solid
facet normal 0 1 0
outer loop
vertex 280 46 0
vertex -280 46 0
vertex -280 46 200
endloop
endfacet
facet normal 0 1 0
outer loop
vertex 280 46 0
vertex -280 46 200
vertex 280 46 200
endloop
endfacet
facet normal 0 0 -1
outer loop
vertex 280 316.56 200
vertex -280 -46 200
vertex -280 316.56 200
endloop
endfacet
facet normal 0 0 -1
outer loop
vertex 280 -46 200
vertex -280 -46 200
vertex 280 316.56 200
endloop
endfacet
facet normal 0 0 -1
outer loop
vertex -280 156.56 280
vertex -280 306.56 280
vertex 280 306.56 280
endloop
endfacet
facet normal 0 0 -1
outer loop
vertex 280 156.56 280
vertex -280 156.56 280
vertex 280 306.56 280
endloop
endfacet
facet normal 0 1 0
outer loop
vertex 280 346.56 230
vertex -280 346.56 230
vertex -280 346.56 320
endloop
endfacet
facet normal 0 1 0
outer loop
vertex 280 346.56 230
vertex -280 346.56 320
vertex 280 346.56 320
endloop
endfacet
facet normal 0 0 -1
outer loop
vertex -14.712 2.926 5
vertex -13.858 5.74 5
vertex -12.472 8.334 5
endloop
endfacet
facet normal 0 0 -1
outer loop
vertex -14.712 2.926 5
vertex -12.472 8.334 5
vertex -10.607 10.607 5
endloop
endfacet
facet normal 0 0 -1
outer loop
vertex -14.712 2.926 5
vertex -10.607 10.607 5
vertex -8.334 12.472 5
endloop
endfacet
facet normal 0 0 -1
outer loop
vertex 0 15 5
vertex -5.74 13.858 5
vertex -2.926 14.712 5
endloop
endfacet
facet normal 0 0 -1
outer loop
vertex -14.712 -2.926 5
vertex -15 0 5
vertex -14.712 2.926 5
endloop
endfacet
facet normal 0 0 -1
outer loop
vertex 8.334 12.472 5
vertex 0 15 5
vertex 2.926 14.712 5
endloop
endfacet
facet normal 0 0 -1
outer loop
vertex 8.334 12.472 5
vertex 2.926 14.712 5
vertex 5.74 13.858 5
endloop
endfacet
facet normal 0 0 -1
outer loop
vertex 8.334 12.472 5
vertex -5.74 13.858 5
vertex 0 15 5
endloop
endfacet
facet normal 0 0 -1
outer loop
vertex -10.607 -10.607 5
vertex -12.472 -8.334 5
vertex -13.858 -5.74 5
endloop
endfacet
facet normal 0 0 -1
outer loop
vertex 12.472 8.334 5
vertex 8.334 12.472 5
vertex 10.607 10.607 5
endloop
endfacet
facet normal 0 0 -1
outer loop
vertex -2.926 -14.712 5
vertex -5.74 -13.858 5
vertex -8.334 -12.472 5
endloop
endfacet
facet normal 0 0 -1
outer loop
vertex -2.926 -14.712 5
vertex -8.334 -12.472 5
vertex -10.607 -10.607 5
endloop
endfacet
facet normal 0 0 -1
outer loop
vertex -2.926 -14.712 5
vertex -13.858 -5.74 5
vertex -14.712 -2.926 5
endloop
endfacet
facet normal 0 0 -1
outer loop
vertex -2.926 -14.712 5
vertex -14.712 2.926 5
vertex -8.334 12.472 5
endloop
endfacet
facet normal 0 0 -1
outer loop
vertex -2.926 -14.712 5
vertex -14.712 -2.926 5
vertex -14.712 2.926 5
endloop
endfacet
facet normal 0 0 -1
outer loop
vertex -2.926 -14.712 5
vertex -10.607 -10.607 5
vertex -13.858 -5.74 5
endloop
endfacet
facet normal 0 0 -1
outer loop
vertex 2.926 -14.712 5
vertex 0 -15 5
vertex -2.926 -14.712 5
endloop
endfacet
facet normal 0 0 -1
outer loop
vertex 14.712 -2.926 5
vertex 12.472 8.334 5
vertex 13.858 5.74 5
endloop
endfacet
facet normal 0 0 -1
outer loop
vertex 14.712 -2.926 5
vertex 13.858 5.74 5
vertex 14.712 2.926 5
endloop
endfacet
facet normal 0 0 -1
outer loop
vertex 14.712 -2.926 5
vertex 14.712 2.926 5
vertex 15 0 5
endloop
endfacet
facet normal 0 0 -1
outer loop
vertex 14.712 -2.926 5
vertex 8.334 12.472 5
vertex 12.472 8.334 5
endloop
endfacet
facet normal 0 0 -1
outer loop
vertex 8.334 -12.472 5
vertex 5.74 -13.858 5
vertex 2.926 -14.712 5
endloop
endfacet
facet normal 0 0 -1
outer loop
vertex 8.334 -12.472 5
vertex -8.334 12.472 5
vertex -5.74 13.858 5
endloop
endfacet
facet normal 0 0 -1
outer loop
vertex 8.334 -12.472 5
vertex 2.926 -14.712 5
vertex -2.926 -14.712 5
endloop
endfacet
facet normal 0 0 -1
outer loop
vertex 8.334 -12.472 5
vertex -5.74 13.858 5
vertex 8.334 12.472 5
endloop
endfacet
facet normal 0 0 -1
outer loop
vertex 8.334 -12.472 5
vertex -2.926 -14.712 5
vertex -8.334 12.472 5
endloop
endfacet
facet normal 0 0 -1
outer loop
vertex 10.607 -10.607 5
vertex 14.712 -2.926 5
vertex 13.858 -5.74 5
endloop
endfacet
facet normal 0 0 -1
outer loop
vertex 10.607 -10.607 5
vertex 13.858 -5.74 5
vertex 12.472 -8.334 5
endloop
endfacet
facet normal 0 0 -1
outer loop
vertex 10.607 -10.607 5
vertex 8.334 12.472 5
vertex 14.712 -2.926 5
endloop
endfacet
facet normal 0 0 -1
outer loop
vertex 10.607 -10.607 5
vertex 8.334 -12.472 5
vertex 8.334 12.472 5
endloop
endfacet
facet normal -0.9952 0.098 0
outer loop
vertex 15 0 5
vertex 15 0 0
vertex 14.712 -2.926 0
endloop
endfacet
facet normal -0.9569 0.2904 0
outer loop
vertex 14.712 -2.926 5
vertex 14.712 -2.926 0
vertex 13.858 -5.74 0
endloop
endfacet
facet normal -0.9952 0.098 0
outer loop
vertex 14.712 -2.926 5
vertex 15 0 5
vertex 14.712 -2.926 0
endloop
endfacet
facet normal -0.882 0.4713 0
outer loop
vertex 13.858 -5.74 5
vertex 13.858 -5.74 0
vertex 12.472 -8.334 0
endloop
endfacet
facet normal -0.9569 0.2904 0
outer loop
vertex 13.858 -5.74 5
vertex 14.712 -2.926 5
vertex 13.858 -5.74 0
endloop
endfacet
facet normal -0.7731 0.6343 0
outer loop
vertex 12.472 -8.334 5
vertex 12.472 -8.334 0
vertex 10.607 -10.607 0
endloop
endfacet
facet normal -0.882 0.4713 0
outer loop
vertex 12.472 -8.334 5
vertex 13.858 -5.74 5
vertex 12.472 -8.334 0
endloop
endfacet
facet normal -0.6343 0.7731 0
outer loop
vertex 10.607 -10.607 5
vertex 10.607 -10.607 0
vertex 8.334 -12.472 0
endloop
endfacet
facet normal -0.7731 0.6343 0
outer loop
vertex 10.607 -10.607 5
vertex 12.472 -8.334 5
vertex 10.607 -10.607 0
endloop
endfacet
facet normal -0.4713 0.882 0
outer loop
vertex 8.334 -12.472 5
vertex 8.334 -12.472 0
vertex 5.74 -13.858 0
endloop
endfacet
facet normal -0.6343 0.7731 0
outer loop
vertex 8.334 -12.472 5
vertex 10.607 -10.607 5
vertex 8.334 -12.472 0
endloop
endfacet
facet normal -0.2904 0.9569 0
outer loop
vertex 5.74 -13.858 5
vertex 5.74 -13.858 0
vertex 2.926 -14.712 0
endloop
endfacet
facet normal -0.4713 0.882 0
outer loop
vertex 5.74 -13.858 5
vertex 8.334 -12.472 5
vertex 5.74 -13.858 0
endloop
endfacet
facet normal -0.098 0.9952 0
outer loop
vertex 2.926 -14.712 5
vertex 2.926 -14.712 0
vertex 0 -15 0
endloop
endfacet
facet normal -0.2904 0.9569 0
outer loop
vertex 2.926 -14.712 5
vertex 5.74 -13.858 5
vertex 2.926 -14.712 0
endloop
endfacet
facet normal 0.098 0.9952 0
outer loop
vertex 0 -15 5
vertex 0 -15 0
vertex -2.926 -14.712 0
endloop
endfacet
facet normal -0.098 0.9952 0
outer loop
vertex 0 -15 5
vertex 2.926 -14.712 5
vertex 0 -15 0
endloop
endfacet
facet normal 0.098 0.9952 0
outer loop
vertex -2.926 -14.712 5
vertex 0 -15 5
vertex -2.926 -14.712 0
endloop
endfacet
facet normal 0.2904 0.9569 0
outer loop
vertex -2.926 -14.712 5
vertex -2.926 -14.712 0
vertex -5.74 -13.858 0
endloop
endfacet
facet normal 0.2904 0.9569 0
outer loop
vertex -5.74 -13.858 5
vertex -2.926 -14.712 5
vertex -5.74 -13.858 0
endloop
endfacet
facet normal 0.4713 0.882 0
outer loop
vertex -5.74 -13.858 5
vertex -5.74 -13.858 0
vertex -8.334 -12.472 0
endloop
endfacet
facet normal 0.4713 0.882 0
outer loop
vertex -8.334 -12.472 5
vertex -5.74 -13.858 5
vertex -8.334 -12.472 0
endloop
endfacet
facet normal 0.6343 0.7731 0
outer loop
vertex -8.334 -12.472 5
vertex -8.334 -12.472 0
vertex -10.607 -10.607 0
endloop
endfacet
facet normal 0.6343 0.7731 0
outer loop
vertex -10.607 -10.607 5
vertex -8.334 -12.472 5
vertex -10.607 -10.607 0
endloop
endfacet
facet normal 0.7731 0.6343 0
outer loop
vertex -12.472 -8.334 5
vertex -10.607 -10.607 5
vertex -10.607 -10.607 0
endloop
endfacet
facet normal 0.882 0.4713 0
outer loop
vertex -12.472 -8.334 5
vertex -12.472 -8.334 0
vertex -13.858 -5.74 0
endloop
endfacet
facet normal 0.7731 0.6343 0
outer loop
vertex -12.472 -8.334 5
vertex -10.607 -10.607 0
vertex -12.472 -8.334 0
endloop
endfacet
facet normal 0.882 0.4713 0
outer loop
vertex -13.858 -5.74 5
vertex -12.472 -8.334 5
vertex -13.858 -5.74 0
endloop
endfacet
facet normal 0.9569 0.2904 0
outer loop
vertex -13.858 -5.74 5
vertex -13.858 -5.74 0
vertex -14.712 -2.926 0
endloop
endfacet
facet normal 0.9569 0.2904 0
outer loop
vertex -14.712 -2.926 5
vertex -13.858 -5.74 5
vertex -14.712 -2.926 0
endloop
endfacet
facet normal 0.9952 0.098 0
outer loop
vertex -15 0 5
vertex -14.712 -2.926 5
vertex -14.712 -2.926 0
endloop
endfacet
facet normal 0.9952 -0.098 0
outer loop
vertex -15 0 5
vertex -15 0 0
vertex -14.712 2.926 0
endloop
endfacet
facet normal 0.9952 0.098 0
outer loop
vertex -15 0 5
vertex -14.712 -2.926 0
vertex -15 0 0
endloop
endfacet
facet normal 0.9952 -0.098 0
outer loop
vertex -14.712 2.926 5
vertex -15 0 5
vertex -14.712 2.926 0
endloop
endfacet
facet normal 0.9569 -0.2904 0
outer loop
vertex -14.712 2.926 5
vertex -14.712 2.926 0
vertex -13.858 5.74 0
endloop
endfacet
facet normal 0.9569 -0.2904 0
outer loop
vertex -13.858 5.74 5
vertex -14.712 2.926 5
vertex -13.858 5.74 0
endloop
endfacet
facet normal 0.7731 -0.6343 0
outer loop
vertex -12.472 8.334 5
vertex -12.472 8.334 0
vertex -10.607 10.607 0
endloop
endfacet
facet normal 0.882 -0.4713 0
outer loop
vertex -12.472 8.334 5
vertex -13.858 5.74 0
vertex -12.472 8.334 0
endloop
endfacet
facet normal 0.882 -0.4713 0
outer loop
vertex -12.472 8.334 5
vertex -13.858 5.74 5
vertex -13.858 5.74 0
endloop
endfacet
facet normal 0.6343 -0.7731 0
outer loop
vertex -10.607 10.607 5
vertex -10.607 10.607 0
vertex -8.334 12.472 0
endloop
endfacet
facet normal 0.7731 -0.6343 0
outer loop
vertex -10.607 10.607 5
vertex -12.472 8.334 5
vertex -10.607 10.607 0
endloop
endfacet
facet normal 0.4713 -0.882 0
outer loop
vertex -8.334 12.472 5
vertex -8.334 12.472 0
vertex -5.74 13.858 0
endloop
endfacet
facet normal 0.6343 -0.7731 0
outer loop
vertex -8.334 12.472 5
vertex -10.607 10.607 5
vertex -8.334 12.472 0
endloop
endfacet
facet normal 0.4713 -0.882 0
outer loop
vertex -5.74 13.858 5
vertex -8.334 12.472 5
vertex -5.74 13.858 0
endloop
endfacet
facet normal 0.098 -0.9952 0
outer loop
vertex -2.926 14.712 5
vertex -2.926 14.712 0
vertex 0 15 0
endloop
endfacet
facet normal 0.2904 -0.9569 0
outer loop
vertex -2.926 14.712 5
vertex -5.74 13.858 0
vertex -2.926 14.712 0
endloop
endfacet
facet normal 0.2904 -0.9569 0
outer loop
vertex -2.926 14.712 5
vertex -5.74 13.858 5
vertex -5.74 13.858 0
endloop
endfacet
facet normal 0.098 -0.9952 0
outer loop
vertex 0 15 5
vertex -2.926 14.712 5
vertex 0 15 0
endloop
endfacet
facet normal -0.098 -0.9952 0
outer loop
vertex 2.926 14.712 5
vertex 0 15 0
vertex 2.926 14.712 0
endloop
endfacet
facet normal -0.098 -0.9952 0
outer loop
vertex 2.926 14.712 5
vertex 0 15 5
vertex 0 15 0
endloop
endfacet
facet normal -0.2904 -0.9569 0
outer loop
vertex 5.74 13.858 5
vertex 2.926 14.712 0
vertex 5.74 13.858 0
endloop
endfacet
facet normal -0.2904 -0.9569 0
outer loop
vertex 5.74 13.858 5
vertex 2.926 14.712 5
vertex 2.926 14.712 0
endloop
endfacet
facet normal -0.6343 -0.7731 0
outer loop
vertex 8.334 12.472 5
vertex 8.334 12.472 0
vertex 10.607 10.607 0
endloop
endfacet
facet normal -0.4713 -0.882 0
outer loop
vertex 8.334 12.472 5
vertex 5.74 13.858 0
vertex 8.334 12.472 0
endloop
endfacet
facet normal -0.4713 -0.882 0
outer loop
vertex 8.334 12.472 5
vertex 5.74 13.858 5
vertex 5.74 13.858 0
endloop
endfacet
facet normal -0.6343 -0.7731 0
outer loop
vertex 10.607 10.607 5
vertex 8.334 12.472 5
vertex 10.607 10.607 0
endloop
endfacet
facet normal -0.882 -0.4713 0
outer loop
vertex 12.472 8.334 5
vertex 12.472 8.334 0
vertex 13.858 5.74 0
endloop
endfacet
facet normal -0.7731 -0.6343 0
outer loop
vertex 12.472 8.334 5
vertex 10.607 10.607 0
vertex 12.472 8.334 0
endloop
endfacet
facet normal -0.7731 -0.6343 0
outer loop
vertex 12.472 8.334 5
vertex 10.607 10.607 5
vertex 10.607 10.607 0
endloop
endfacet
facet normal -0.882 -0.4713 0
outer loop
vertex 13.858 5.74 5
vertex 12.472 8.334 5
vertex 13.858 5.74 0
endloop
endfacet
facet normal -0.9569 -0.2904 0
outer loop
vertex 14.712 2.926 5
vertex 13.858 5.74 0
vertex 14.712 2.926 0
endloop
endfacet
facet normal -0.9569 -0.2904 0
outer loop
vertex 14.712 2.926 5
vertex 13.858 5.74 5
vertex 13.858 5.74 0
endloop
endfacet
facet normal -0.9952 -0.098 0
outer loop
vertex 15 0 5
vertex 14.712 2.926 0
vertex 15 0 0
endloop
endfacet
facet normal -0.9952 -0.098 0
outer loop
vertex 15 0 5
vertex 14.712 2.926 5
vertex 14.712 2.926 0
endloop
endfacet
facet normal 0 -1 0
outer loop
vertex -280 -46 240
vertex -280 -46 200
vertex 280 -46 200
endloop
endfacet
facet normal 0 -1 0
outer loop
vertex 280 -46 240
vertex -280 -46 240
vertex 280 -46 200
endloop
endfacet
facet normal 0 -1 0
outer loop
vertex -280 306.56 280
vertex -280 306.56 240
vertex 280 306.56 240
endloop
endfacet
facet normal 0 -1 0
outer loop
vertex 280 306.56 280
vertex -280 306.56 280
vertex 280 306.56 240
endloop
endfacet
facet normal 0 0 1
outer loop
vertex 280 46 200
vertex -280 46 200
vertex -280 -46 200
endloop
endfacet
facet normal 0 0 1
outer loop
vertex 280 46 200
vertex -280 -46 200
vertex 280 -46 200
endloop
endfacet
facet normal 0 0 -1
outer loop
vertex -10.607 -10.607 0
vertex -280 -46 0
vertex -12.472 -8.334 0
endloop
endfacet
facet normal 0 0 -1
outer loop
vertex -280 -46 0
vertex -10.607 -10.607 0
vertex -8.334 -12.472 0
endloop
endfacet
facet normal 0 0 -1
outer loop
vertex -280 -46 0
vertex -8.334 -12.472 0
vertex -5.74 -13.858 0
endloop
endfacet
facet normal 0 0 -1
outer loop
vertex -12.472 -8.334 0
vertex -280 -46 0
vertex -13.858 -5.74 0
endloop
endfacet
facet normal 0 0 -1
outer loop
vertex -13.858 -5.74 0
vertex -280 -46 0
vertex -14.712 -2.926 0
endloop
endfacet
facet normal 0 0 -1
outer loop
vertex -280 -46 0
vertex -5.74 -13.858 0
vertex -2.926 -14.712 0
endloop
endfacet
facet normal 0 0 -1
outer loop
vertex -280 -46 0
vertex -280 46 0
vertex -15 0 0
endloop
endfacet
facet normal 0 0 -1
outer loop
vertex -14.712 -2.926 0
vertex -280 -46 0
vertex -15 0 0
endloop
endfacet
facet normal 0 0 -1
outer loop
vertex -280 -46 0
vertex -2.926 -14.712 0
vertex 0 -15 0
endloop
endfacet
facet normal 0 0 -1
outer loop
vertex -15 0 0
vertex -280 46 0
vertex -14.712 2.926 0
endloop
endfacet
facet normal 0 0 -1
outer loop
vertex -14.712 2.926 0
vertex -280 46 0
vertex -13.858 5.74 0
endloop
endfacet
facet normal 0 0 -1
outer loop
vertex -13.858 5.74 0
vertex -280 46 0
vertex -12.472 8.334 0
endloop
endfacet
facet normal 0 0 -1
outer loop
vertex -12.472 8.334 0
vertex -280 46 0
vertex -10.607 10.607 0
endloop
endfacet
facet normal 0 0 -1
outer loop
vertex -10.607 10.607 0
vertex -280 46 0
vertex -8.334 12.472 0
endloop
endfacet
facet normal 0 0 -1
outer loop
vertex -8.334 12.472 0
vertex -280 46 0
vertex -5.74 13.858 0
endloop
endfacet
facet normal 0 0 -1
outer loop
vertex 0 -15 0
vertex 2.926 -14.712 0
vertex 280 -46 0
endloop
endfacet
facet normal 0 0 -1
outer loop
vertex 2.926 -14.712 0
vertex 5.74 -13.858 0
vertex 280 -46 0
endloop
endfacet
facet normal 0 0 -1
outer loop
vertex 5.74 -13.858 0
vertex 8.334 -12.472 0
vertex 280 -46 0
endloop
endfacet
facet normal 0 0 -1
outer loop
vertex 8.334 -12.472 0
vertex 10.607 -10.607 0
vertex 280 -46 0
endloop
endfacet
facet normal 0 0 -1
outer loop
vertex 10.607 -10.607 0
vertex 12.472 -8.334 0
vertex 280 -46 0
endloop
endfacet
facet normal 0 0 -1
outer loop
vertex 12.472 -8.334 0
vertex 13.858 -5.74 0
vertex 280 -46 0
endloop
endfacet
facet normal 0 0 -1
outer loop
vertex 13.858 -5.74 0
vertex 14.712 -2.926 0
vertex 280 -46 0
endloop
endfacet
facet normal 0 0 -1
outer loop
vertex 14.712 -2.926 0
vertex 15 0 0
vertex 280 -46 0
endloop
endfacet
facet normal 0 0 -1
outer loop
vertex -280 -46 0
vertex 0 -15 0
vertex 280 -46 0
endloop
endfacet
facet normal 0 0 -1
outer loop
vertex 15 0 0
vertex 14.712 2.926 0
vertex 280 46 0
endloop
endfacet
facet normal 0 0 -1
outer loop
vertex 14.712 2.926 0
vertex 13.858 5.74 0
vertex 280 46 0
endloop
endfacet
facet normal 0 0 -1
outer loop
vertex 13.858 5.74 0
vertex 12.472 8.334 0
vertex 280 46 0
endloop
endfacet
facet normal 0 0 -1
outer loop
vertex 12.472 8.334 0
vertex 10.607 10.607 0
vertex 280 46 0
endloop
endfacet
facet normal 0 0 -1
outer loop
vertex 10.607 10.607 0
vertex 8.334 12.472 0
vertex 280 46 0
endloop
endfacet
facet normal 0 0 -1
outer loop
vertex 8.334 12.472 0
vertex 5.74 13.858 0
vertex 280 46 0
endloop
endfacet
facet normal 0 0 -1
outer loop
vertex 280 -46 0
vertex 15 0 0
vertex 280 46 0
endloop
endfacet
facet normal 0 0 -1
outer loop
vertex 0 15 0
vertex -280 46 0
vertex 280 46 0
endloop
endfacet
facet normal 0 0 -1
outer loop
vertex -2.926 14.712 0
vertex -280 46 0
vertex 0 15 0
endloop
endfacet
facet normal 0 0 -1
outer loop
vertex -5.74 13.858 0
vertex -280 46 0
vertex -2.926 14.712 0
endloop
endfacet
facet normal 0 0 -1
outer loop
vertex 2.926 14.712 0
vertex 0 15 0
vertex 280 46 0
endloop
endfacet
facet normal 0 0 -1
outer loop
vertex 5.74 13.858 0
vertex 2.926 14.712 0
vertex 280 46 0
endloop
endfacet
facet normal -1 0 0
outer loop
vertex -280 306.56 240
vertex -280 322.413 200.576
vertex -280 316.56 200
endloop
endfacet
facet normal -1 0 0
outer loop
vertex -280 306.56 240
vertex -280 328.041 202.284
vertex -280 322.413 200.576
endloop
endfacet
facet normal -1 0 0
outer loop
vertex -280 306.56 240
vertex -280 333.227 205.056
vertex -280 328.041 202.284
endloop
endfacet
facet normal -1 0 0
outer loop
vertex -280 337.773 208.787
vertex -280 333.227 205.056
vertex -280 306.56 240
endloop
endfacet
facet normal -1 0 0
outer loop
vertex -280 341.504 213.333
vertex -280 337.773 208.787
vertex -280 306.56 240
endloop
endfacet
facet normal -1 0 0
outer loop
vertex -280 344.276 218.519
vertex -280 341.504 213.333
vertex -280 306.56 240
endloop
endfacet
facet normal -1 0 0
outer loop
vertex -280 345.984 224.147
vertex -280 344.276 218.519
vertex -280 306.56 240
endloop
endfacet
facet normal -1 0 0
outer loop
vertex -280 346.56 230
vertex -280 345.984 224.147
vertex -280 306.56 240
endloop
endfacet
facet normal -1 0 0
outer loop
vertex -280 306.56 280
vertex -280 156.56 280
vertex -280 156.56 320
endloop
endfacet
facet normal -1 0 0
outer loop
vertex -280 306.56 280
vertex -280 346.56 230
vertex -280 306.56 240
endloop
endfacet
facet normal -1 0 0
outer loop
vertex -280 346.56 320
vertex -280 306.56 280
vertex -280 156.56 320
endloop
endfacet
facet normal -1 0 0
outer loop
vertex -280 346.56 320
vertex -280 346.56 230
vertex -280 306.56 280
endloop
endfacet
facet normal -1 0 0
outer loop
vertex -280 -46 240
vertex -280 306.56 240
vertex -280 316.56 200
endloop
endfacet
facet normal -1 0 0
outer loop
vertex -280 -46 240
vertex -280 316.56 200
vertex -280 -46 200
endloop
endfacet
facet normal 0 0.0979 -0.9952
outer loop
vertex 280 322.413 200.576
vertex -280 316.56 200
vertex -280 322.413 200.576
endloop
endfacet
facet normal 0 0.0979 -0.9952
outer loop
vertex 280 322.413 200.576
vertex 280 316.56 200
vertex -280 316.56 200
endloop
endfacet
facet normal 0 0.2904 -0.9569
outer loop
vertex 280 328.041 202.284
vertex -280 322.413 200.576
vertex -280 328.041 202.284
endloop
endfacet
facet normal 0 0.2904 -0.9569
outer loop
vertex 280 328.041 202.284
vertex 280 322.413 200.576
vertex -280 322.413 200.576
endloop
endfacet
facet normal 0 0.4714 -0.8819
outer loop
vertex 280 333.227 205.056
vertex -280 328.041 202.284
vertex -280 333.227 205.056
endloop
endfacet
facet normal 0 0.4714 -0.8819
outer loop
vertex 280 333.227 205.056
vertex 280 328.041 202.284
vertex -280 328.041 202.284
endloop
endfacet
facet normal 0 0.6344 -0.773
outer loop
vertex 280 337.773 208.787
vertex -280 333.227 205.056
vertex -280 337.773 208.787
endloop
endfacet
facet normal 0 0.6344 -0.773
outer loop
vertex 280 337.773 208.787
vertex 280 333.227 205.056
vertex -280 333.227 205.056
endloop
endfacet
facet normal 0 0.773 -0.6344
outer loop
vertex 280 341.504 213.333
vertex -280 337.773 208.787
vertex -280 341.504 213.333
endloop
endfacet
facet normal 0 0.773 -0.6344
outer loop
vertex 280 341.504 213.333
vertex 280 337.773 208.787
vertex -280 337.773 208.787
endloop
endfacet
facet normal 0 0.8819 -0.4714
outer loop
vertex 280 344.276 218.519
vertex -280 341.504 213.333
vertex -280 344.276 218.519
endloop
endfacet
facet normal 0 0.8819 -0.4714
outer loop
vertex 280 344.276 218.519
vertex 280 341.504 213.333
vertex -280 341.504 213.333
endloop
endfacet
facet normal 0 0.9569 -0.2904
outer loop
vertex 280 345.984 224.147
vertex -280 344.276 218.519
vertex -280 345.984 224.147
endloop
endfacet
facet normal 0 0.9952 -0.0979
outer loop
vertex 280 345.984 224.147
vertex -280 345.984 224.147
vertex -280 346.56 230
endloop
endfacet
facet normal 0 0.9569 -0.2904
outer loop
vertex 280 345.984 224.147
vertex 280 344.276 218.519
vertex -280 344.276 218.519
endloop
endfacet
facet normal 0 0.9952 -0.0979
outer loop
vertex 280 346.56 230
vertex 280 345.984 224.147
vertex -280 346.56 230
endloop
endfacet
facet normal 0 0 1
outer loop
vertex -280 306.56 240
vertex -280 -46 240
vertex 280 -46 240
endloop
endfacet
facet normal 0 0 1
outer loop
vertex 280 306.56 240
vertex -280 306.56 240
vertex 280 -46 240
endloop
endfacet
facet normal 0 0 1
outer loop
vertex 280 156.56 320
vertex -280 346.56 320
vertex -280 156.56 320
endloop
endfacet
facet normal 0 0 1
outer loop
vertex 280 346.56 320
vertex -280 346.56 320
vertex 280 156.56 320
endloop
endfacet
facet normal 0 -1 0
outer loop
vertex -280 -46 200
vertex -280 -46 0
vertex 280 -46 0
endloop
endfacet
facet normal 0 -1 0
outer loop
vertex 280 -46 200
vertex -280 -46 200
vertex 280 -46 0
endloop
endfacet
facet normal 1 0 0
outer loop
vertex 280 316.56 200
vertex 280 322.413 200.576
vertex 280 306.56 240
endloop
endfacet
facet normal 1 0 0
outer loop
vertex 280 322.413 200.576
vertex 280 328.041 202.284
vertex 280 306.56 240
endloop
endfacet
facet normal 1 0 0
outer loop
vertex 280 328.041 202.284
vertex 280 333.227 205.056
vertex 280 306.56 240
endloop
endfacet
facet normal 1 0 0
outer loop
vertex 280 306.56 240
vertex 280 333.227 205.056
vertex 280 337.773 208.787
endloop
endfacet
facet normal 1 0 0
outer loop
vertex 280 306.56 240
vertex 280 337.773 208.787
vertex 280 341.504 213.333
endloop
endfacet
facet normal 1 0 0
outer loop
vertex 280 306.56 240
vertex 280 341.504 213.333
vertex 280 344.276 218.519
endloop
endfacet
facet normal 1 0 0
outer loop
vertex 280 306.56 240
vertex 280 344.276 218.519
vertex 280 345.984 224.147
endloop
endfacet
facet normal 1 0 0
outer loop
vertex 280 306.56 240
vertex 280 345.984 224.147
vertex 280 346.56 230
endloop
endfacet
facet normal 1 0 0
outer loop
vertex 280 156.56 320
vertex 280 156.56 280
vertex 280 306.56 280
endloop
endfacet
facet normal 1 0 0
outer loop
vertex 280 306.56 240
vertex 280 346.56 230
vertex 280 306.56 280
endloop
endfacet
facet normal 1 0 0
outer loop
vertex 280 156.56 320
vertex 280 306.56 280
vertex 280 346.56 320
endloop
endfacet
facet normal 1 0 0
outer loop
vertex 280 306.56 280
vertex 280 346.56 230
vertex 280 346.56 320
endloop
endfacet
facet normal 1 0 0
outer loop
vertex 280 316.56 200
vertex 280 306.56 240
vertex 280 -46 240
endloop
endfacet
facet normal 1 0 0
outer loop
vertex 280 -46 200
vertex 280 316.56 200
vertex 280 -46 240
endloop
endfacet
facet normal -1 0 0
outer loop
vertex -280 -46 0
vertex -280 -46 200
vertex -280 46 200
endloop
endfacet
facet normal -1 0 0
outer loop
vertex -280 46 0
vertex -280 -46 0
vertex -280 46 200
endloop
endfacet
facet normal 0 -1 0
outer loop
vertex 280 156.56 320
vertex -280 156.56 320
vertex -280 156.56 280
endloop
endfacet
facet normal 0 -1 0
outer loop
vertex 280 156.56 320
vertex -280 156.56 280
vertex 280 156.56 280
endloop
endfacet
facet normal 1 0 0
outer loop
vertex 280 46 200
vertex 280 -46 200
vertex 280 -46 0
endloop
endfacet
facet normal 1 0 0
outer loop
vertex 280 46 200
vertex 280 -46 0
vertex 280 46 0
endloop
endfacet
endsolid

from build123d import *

# Parameters (mm, degrees)
SKETCH1_W               = 560
SKETCH1_H               = 92
BOSS_EXTRUDE1_DEPTH     = 200
SKETCH2_W               = 560
SKETCH2_H               = 352.56
BOSS_EXTRUDE2_DEPTH     = 40
CUT_EXTRUDE1_DEPTH      = 480.56129285
CUT_EXTRUDE1_DEPTH_BACK = 5
SKETCH3_R               = 15
SKETCH4_W               = 560
SKETCH4_H               = 40
BOSS_EXTRUDE3_DEPTH     = 40
SKETCH5_W               = 560
SKETCH5_H               = 40
BOSS_EXTRUDE4_DEPTH     = 40
FILLET1_R               = 30
SKETCH6_W               = 560
SKETCH6_H               = 40
BOSS_EXTRUDE5_DEPTH     = 40
SKETCH7_W               = 560
SKETCH7_H               = 40
BOSS_EXTRUDE6_DEPTH     = 150


with BuildPart() as part:
    # Sketch1 → Boss-Extrude1 (new body)
    with BuildSketch(Plane.XY):
        Rectangle(SKETCH1_W, SKETCH1_H)
    extrude(amount=BOSS_EXTRUDE1_DEPTH)

    # Sketch3 → Cut-Extrude1 (cut, two sides: drawn at the far end of the back side and taken through both)
    with BuildSketch(Plane(origin=(0, 0, 0), x_dir=(-1, 0, 0), z_dir=(0, 0, -1)).offset(-CUT_EXTRUDE1_DEPTH_BACK)):
        with Locations(Location((0, 0, 0), (0, 0, 180))):
            Circle(SKETCH3_R)
    extrude(amount=CUT_EXTRUDE1_DEPTH + CUT_EXTRUDE1_DEPTH_BACK, mode=Mode.SUBTRACT)


with BuildPart() as body_2:
    # Sketch2 → Boss-Extrude2 (new body)
    with BuildSketch(Plane.XY.offset(200)):
        with Locations((0, 130.28)):
            Rectangle(SKETCH2_W, SKETCH2_H)
    extrude(amount=BOSS_EXTRUDE2_DEPTH)

    # Sketch4 → Boss-Extrude3 (add)
    with BuildSketch(Plane(origin=(0, 306.56, 0), x_dir=(1, 0, 0), z_dir=(0, 1, 0))):
        with Locations((0, -220)):
            Rectangle(SKETCH4_W, SKETCH4_H)
    extrude(amount=BOSS_EXTRUDE3_DEPTH)

    # Sketch5 → Boss-Extrude4 (add)
    with BuildSketch(Plane.XY.offset(240)):
        with Locations((0, 326.56)):
            Rectangle(SKETCH5_W, SKETCH5_H)
    extrude(amount=BOSS_EXTRUDE4_DEPTH)

    # Fillet1
    fillet1_edges = [body_2.edges().sort_by_distance(p)[0] for p in [
        (0, 346.56, 200),
    ]]
    fillet(fillet1_edges, radius=FILLET1_R)

    # Sketch6 → Boss-Extrude5 (add)
    with BuildSketch(Plane.XY.offset(280)):
        with Locations((0, 326.56)):
            Rectangle(SKETCH6_W, SKETCH6_H)
    extrude(amount=BOSS_EXTRUDE5_DEPTH)

    # Sketch7 → Boss-Extrude6 (add)
    with BuildSketch(Plane.XZ.offset(-306.56)):
        with Locations((0, 300)):
            Rectangle(SKETCH7_W, SKETCH7_H)
    extrude(amount=BOSS_EXTRUDE6_DEPTH)


solid = Compound([part.part, body_2.part])
